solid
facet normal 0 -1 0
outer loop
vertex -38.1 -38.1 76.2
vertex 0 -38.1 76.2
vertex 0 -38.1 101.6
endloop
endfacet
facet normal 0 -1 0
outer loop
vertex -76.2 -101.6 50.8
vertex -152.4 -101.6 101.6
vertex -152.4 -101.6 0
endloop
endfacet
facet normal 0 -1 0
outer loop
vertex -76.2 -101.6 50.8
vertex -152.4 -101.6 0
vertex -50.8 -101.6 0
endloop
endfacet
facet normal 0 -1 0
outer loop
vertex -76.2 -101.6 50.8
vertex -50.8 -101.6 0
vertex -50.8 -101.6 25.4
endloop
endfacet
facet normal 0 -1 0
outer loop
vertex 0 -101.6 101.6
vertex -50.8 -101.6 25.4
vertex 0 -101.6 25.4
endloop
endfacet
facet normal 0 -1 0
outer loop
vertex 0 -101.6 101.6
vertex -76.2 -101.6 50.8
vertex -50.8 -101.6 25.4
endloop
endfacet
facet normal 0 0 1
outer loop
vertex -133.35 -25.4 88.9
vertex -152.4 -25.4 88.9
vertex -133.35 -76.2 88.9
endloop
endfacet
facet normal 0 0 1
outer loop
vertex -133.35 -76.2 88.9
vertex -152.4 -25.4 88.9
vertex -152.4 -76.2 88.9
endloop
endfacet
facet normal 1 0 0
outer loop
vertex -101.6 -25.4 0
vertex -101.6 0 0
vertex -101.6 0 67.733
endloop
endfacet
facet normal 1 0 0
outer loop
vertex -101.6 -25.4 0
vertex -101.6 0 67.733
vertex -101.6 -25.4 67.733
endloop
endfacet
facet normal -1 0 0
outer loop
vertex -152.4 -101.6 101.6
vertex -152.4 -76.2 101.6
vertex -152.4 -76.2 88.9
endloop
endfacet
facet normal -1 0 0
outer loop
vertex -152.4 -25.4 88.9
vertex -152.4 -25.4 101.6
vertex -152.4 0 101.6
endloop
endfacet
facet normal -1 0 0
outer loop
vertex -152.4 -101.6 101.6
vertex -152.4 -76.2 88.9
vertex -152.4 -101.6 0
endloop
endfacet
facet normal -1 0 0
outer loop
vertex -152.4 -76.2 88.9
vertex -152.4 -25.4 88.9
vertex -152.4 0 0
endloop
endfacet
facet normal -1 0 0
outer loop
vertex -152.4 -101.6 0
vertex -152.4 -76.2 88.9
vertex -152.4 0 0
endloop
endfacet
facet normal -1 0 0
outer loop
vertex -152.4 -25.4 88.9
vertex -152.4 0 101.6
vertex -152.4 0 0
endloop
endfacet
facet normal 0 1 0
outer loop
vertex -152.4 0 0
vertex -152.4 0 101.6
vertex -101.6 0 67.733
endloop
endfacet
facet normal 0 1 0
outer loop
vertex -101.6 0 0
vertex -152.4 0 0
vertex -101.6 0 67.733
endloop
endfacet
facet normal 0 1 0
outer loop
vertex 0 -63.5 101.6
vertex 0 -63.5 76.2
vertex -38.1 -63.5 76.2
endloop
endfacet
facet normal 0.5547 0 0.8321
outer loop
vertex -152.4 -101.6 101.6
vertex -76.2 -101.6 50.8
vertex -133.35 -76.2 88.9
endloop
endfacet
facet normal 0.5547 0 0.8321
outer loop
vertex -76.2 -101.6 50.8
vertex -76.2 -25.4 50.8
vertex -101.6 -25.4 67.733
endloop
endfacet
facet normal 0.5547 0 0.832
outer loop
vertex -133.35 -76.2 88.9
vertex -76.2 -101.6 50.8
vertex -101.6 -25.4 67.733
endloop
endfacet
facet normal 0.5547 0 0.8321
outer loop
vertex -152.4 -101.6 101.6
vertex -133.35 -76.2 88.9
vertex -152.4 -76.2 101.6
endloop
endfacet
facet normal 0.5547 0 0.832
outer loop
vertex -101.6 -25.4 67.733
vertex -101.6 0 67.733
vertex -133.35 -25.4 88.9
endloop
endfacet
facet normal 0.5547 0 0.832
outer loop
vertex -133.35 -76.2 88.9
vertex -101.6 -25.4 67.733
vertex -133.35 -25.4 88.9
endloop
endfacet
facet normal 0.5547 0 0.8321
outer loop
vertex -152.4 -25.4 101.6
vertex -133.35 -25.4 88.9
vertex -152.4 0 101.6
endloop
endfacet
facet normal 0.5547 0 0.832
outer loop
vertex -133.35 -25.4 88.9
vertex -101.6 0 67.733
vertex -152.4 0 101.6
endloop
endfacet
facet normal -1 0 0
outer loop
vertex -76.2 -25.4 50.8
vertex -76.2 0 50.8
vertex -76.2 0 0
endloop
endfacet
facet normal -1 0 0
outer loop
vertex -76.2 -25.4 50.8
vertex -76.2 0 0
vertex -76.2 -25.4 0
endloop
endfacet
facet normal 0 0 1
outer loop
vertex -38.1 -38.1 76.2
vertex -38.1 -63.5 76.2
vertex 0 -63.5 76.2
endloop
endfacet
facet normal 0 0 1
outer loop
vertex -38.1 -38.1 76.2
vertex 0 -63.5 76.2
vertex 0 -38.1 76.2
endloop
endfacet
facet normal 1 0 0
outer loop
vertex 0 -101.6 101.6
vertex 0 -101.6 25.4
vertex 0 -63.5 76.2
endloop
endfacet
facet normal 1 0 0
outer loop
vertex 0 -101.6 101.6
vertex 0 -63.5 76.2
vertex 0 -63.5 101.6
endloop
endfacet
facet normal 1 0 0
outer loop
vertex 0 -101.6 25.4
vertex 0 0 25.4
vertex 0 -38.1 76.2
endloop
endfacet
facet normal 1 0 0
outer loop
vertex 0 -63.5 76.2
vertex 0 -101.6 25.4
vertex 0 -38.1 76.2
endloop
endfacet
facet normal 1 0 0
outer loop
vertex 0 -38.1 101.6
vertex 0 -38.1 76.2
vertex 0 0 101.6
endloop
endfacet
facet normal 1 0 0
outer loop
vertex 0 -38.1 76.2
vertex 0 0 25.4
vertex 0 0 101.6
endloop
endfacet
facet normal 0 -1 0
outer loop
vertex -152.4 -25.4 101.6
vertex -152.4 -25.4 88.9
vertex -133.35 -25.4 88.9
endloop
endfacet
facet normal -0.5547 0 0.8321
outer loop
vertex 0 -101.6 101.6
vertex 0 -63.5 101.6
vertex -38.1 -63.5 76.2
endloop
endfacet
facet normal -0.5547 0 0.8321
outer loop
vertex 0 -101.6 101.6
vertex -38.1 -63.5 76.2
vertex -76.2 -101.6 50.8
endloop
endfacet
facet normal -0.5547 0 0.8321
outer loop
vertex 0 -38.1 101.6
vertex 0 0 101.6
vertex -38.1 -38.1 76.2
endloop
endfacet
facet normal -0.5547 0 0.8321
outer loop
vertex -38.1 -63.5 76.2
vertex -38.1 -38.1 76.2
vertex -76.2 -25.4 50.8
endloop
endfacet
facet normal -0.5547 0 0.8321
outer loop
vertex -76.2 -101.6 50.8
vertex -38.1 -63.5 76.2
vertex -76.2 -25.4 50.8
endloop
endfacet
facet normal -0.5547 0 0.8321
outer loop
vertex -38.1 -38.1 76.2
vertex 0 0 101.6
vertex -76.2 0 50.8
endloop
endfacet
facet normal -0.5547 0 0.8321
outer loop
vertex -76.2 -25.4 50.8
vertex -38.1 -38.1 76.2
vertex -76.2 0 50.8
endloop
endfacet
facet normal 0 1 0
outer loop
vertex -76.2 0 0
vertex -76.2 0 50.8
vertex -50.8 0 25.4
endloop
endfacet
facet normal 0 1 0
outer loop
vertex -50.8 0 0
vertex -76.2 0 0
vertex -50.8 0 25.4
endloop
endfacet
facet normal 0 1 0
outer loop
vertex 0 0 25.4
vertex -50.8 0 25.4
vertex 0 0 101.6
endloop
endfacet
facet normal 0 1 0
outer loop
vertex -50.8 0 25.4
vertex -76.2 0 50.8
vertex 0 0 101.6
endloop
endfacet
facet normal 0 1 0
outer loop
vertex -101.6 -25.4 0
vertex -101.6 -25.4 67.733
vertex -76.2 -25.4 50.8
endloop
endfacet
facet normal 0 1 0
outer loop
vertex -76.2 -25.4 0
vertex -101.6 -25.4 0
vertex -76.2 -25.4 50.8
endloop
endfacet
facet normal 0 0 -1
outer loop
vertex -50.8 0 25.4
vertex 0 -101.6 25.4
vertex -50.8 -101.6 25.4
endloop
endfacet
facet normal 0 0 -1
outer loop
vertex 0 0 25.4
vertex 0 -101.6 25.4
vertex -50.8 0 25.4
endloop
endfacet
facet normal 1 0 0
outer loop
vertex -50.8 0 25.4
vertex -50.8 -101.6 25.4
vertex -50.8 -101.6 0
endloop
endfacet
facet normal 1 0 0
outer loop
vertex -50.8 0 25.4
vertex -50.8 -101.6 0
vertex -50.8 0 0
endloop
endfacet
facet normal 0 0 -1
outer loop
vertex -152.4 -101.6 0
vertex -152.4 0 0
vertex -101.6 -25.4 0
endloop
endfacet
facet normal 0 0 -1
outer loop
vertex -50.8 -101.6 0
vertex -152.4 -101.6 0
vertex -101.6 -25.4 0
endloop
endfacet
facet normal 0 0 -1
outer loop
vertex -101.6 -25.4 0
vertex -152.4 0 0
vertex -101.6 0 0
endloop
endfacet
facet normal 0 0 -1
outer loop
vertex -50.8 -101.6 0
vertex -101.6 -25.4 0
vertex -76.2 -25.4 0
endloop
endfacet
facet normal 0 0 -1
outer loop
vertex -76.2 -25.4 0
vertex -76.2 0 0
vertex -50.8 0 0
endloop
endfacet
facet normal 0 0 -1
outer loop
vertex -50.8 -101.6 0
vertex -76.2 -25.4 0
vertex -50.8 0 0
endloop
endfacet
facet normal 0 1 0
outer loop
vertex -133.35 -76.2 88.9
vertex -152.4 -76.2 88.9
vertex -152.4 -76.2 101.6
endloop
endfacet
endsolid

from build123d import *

# Parameters (mm, degrees)
F1_DEPTH = 101.6
F2_W     = 25.4
F2_H     = 25.4
F2_W_2   = 101.6
F3_DEPTH = 50.8
F4_W     = 25.4
F4_H     = 25.4
F5_DEPTH = 101.601
F6_W     = 50.8
F6_H     = 12.7
F7_DEPTH = 25.4


with BuildPart() as f1:
    # F0 (on Front) → F1 (new body)
    with BuildSketch(Plane.XZ):
        Polygon((-152.4, 0), (0, 0), (-76.2, 50.8), align=None)
        Polygon((-76.2, 50.8), (0, 0), (0, 101.6), align=None)
        Polygon((-152.4, 101.6), (-152.4, 0), (-76.2, 50.8), align=None)
    extrude(amount=F1_DEPTH)

    # F2 (on face) → F3 (cut)
    with BuildSketch(Plane.YZ):
        with Locations((-50.8, 88.9)):
            Rectangle(F2_W, F2_H)
        with Locations((-50.8, 12.7)):
            Rectangle(F2_W_2, F2_H)
    extrude(amount=-F3_DEPTH, mode=Mode.SUBTRACT)

    # F4 (on face) → F5 (cut, through all)
    with BuildSketch(Plane(origin=(0, 0, 0), x_dir=(1, 0, 0), z_dir=(0, 0, -1))):
        with Locations((-88.9, 12.7)):
            Rectangle(F4_W, F4_H)
    extrude(amount=-F5_DEPTH, mode=Mode.SUBTRACT)

    # F6 (on face) → F7 (cut)
    with BuildSketch(Plane(origin=(-152.4, 0, 0), x_dir=(0, -1, 0), z_dir=(-1, 0, 0))):
        with Locations((50.8, 95.25)):
            Rectangle(F6_W, F6_H)
    extrude(amount=-F7_DEPTH, mode=Mode.SUBTRACT)


solid = f1.part
